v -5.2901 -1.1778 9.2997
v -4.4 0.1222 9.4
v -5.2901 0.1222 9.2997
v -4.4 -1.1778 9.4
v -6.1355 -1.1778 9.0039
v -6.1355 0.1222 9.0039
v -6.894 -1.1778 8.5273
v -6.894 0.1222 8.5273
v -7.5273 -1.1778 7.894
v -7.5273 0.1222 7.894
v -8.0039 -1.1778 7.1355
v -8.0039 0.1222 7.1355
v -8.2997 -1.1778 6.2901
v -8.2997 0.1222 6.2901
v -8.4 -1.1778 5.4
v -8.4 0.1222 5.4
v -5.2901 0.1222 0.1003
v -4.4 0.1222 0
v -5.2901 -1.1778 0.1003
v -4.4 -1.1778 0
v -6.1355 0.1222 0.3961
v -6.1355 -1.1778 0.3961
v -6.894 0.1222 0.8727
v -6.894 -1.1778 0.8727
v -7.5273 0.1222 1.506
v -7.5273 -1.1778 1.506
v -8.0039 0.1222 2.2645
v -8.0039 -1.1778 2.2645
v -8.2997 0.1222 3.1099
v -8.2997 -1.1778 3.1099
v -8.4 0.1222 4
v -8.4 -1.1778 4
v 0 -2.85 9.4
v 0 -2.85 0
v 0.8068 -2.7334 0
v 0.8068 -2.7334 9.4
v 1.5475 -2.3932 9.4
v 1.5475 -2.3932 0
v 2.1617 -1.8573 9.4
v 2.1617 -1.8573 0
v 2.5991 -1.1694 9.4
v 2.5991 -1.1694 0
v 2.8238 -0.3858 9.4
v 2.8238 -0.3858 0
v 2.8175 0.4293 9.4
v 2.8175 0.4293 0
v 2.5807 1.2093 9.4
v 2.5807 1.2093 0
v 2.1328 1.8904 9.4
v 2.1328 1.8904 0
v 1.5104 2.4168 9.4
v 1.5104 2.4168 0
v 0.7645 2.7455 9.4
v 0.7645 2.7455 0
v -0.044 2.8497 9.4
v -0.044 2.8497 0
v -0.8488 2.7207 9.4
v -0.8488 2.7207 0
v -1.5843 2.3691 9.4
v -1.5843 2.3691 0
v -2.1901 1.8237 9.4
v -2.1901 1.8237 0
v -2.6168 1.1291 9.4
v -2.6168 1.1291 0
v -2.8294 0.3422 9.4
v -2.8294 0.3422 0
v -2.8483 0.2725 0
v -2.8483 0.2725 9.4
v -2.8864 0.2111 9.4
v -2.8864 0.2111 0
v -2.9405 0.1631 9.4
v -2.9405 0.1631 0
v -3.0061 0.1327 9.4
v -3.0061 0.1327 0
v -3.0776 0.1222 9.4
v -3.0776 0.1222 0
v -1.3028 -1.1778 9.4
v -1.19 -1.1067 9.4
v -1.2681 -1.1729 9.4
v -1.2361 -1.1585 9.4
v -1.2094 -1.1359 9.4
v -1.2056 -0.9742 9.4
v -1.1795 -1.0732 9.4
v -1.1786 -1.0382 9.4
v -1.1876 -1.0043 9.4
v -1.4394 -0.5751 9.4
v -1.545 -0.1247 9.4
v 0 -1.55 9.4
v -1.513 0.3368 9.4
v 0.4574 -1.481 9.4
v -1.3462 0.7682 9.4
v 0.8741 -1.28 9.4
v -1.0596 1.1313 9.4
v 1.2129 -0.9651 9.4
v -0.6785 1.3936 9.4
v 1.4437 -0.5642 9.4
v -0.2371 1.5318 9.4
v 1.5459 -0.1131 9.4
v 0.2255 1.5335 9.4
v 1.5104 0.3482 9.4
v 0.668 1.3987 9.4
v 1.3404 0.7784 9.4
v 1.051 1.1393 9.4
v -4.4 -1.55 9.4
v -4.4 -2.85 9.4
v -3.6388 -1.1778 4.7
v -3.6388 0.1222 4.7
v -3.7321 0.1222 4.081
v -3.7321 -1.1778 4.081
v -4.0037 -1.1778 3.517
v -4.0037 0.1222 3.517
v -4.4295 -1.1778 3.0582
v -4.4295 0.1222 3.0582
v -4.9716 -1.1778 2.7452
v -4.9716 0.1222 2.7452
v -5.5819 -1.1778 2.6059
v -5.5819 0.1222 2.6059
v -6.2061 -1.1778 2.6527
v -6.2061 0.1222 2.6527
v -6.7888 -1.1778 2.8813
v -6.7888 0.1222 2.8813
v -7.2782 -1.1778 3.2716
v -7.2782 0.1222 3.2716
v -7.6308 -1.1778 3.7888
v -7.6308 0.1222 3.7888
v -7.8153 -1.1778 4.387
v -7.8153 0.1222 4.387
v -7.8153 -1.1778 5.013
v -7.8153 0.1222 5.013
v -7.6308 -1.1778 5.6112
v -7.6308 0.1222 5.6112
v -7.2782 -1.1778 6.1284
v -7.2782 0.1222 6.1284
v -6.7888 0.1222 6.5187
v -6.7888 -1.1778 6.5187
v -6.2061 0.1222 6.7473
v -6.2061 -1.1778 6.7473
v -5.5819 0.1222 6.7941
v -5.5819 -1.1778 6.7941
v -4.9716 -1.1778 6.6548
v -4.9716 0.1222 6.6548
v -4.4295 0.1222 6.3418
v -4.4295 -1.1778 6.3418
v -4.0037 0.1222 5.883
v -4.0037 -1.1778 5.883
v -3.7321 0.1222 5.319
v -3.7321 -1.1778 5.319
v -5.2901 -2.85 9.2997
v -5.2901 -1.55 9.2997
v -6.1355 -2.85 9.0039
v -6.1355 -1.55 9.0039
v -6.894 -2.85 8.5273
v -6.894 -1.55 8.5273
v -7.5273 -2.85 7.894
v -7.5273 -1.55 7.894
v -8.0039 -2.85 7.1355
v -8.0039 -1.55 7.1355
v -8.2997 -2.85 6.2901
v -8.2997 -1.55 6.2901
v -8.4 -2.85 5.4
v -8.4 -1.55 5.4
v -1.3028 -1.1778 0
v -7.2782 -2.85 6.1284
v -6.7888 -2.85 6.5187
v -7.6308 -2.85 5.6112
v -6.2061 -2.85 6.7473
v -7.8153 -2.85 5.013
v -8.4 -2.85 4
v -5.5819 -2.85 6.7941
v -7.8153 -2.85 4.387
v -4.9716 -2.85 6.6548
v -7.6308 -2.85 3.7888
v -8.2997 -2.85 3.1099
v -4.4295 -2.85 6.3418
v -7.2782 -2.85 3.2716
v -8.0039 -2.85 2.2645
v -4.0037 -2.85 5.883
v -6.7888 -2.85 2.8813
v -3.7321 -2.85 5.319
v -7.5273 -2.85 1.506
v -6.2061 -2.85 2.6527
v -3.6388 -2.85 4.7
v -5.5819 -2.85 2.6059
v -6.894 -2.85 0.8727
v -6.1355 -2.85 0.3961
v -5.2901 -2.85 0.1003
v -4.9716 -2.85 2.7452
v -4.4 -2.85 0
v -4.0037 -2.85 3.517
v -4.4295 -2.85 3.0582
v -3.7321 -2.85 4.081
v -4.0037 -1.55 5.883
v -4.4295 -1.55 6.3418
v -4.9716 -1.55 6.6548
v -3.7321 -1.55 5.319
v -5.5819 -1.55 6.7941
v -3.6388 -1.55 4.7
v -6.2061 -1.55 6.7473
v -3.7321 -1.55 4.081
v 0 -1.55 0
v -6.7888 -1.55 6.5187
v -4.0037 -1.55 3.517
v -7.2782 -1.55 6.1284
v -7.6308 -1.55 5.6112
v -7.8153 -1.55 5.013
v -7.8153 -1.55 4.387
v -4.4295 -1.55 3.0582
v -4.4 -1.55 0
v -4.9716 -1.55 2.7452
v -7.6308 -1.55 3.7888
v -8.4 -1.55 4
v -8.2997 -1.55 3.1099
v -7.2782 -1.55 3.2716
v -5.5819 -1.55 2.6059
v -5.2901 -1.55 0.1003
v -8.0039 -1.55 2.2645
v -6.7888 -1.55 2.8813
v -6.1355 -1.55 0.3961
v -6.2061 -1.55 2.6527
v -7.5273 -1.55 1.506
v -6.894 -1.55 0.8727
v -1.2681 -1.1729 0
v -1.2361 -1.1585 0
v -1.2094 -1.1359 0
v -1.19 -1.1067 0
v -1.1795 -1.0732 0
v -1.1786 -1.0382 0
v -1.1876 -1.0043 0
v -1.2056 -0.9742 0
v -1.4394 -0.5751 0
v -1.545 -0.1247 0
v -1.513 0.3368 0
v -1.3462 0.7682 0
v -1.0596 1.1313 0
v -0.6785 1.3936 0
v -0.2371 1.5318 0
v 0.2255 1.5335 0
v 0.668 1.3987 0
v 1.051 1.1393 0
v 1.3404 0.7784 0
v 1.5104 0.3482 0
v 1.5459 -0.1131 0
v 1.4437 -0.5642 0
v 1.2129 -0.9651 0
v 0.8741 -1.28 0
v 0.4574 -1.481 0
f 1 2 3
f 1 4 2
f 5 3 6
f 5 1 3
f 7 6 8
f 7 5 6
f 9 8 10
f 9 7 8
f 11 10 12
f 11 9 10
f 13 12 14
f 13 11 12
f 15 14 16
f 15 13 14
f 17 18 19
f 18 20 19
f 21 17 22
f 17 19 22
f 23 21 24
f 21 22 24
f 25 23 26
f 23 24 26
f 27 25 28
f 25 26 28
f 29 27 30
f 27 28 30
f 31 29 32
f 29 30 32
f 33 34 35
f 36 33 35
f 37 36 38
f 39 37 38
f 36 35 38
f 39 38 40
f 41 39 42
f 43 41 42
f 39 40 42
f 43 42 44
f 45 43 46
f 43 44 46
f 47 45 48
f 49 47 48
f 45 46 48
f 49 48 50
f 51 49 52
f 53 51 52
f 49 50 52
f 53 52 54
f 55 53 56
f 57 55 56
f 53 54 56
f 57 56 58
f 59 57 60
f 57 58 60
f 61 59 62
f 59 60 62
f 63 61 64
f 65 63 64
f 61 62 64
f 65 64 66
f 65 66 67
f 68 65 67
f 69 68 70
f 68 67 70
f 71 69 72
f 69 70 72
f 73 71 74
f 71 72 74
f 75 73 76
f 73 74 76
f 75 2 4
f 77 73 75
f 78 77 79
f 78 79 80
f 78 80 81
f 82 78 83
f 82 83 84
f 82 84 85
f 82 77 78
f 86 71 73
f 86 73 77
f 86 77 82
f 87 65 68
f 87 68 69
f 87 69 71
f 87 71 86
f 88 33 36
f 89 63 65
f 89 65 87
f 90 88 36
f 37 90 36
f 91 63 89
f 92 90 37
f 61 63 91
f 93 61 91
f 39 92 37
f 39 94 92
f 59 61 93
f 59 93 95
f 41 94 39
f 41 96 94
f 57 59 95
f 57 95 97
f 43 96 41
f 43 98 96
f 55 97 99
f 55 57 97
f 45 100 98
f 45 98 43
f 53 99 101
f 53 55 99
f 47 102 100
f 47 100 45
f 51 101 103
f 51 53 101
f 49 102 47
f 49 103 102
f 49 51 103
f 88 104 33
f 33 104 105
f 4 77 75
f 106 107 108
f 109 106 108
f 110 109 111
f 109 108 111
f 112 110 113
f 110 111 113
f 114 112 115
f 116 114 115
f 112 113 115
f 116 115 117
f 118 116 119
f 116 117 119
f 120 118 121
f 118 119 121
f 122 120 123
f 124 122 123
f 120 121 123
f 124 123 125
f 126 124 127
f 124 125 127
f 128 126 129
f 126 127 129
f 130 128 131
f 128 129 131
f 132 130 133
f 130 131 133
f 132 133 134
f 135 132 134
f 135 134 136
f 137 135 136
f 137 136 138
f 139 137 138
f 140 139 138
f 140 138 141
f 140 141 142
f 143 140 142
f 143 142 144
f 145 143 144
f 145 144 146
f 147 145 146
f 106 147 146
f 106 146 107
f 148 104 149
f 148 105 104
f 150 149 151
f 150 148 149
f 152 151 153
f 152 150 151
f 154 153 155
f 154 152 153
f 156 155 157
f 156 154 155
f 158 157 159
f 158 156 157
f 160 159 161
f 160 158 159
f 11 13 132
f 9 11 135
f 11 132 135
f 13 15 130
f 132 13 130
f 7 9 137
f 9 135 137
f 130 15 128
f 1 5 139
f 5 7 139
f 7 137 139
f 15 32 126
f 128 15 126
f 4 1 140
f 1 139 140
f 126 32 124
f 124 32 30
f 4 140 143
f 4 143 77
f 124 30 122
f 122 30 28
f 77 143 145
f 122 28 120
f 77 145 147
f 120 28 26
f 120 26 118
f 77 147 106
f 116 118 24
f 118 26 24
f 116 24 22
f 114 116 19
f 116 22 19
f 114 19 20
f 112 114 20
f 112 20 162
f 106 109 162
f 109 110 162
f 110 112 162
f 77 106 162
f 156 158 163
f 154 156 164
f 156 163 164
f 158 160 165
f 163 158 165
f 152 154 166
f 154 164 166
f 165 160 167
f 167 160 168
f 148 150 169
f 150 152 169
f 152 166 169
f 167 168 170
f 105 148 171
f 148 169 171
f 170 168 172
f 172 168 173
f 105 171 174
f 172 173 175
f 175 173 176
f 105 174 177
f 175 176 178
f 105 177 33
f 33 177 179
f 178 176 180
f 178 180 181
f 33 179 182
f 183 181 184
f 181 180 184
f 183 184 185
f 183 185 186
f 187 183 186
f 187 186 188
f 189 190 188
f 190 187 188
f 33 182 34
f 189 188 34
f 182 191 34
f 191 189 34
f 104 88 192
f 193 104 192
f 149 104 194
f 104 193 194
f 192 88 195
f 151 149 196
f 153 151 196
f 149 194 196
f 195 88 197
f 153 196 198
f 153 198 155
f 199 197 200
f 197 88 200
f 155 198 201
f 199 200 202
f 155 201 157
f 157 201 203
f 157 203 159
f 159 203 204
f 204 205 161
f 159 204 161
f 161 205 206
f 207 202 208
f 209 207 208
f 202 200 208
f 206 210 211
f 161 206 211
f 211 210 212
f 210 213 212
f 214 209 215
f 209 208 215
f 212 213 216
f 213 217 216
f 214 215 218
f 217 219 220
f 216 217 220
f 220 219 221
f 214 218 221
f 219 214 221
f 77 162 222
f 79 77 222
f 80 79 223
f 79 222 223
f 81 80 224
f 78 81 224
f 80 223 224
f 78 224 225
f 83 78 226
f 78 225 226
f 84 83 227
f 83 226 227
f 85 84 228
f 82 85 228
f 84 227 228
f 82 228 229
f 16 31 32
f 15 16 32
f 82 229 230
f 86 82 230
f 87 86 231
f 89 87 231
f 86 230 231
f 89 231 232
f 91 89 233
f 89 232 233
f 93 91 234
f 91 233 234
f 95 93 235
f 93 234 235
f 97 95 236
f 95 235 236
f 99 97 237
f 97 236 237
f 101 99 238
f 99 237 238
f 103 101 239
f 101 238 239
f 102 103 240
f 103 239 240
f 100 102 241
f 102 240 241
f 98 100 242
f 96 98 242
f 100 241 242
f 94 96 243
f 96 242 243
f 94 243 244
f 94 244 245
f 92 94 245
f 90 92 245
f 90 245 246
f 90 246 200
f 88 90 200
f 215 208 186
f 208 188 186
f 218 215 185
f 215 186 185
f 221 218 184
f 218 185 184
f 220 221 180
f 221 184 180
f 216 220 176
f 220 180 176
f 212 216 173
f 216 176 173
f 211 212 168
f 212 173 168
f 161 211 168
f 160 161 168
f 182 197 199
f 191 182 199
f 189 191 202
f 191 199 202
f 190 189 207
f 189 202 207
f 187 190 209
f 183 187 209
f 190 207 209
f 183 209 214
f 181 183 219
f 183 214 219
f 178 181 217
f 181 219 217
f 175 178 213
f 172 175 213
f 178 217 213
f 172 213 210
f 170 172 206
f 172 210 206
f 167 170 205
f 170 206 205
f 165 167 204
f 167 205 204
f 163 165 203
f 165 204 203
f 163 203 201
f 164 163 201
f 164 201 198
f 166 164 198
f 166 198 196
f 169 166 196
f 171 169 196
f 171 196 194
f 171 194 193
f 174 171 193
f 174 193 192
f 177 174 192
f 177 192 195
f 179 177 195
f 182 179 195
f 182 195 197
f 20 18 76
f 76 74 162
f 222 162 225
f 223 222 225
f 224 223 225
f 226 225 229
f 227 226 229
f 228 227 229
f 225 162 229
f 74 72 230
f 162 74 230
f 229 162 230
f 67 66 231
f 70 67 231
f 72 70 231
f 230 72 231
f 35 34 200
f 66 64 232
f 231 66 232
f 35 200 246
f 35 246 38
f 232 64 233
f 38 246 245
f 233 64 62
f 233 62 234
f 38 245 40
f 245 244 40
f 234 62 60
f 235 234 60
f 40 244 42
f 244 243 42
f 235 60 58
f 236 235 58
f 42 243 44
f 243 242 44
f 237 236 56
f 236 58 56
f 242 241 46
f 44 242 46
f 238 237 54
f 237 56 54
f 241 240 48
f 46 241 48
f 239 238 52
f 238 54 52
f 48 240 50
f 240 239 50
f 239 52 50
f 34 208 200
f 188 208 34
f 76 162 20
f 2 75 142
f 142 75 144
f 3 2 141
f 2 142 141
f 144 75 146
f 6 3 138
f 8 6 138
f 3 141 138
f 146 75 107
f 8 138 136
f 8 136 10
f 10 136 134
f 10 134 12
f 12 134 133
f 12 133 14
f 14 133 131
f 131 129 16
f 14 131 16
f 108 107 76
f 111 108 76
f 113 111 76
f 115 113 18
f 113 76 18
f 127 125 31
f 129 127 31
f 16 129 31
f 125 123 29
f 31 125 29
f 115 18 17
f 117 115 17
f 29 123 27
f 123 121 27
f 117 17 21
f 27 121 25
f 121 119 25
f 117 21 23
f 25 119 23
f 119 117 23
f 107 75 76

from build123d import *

# Parameters (mm, degrees)
BOSS_EXTRUDE1_DEPTH = 9.4
SKETCH2_R           = 2.1
CUT_EXTRUDE1_DEPTH  = 9.4
FILLET1_R           = 4


with BuildPart() as part:
    # Sketch1 → Boss-Extrude1 (new body)
    with BuildSketch(Plane.XY):
        with BuildLine():
            Line((0, -1.55), (-8.4, -1.55))
            Line((-8.4, -1.55), (-8.4, -2.85))
            Line((-8.4, -2.85), (0, -2.85))
            ThreePointArc((0, -2.85), (2.132811003, 1.89040134), (-2.829381598, 0.342198439))
            ThreePointArc((-2.829381598, 0.342198439), (-2.911748288, 0.185127161), (-3.077572967, 0.122215846))
            Line((-3.077572967, 0.122215846), (-8.4, 0.122215846))
            Line((-8.4, 0.122215846), (-8.4, -1.177784154))
            Line((-8.4, -1.177784154), (-1.302793355, -1.177784154))
            ThreePointArc((-1.302793355, -1.177784154), (-1.189997637, -1.106655539), (-1.20556997, -0.974218173))
            ThreePointArc((-1.20556997, -0.974218173), (0.668005177, 1.398666895), (0, -1.55))
        make_face()
    extrude(amount=BOSS_EXTRUDE1_DEPTH)

    # Sketch2 → Cut-Extrude1 (cut)
    with BuildSketch(Plane(origin=(0, 0.122215846, 0), x_dir=(1, 0, 0), z_dir=(0, 1, 0))):
        with Locations((-5.738786483, -4.7)):
            Circle(SKETCH2_R)
    extrude(amount=-CUT_EXTRUDE1_DEPTH, mode=Mode.SUBTRACT)

    # Fillet1
    fillet1_edges = [part.edges().sort_by_distance(p)[0] for p in [
        (-8.4, -0.527784154, 0),
        (-8.4, -2.2, 0),
        (-8.4, -2.2, 9.4),
        (-8.4, -0.527784154, 9.4),
    ]]
    fillet(fillet1_edges, radius=FILLET1_R)


solid = part.part
